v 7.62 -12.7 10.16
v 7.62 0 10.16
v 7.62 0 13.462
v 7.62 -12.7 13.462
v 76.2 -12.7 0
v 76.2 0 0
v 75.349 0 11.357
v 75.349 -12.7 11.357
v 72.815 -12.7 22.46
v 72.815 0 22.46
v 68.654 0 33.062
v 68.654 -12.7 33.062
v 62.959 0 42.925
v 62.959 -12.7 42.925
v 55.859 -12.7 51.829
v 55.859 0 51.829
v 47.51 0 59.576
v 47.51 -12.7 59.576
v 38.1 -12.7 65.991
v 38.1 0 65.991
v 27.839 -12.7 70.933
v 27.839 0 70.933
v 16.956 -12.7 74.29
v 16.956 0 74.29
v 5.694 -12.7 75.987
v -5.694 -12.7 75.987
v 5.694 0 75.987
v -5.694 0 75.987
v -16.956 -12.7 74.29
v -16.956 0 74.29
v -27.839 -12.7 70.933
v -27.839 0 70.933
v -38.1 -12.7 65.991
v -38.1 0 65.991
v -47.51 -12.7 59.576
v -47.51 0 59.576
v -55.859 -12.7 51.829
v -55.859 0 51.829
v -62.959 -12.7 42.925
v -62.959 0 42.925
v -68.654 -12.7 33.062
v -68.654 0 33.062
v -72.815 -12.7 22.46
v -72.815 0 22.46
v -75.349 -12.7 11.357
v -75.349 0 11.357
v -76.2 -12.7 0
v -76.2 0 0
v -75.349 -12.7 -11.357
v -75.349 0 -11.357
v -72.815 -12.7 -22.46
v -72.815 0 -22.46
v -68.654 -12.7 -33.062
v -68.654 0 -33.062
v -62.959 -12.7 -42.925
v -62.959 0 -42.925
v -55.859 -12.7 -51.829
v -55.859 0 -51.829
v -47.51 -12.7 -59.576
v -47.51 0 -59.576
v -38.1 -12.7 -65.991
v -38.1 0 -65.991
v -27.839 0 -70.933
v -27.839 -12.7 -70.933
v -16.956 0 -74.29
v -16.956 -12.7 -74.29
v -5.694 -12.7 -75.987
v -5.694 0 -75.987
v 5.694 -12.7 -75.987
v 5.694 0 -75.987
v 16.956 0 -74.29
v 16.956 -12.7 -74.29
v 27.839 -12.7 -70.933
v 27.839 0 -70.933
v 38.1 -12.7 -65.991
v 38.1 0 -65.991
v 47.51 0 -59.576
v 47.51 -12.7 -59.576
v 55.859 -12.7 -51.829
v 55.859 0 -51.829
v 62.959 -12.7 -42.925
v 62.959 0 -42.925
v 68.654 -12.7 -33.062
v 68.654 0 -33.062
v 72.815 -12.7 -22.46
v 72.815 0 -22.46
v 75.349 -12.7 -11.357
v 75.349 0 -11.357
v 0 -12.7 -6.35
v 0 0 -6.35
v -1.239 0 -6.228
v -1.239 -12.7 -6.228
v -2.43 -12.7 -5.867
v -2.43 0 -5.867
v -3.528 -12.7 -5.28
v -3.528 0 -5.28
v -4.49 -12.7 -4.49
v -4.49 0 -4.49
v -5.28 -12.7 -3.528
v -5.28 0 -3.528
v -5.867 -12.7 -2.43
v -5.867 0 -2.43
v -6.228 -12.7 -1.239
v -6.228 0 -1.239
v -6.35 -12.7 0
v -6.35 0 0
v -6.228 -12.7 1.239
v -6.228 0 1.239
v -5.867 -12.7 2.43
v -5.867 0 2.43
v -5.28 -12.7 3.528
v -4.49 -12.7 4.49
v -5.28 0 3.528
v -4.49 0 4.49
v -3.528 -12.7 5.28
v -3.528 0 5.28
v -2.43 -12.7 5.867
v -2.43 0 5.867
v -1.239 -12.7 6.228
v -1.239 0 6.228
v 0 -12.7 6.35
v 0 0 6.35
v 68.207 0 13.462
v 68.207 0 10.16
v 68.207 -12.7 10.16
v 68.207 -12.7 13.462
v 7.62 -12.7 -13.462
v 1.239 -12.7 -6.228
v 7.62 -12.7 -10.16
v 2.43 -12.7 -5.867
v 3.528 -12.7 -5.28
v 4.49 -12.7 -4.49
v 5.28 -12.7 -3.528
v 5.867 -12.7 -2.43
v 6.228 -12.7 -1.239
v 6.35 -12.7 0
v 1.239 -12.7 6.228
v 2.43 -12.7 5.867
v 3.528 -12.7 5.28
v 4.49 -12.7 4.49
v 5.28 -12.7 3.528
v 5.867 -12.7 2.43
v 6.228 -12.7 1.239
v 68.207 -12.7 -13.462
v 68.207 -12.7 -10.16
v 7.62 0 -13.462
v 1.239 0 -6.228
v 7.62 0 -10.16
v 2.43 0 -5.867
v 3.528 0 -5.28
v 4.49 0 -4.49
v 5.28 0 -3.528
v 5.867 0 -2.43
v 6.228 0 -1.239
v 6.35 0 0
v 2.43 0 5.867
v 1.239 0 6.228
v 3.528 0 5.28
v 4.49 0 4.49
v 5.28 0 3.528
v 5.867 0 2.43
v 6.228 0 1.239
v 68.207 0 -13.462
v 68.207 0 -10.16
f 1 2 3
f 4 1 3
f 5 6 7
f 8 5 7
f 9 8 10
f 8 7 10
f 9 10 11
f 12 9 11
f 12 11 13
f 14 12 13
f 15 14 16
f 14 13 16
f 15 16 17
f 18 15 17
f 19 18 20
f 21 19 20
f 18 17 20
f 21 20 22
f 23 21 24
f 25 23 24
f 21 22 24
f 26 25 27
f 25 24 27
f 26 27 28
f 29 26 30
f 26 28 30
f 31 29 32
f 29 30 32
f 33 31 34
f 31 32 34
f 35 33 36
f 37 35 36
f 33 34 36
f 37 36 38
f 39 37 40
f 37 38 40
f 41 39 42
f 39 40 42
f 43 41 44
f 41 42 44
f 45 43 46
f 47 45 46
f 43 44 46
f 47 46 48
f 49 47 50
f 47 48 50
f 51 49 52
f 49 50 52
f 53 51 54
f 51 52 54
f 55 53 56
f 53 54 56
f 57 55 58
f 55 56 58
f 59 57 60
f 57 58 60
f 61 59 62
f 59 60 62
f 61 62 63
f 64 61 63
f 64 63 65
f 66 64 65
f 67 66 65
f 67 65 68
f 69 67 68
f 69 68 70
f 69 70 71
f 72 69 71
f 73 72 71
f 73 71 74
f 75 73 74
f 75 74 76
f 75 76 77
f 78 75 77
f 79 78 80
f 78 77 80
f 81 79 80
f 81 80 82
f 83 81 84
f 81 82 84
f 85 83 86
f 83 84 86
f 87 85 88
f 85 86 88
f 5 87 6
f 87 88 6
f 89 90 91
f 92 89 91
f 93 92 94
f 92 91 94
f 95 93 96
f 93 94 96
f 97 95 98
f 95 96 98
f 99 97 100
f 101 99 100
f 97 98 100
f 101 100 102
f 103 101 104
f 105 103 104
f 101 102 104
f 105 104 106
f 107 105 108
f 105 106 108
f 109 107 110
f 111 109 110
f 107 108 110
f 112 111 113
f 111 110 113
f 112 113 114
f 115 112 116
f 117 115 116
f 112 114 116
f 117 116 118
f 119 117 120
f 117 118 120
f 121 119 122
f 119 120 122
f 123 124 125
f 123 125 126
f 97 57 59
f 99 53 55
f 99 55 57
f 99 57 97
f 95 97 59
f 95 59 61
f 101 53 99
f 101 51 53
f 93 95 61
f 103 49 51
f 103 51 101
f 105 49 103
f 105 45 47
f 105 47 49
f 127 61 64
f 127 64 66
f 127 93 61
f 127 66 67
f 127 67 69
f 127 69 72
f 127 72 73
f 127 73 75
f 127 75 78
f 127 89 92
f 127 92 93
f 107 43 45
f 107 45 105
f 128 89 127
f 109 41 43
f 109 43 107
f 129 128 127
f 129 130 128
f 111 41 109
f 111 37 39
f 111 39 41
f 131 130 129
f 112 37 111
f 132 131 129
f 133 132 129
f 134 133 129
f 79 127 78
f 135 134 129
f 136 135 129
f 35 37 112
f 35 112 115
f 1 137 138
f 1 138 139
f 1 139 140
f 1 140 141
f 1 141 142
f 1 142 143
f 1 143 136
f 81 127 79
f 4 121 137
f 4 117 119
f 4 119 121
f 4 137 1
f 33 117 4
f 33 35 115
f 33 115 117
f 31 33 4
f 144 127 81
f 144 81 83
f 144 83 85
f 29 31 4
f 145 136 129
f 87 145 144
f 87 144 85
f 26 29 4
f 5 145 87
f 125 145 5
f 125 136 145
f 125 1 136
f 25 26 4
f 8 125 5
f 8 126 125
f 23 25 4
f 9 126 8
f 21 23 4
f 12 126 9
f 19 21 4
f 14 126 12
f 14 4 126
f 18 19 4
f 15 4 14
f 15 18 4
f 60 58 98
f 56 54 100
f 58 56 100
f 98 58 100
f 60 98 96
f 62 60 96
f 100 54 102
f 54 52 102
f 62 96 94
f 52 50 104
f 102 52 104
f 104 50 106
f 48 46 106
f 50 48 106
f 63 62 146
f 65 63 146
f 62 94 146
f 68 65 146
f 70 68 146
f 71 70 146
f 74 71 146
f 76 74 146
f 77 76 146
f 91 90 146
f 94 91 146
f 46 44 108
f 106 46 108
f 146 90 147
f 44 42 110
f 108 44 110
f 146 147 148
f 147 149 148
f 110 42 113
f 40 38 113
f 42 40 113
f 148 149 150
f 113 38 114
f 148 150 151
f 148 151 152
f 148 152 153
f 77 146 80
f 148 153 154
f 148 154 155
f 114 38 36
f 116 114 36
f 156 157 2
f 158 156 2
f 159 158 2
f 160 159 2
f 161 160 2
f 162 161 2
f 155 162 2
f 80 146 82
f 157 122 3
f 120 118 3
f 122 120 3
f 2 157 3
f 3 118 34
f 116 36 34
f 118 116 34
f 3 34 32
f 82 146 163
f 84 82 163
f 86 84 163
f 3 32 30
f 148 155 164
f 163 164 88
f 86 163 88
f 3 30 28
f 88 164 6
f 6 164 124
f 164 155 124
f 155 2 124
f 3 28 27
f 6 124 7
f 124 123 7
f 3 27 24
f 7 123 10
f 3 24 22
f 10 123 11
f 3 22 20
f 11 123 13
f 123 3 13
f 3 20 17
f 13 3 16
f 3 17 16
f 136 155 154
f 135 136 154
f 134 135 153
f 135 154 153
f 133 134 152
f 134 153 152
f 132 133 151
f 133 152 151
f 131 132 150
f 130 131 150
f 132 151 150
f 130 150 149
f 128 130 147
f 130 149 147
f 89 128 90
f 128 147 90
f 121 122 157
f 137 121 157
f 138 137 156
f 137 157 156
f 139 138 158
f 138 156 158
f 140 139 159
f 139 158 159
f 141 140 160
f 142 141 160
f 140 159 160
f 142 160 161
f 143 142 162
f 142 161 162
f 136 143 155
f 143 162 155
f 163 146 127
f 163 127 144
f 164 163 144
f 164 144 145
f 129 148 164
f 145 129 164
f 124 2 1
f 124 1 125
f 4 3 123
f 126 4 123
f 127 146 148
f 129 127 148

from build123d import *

# Parameters (mm, degrees)
F0_R     = 76.2
F0_W     = 60.587234
F0_H     = 3.302
F1_DEPTH = 12.7


with BuildPart() as f1:
    # F0 (on Front) → F1 (new body)
    with BuildSketch(Plane.XZ):
        Circle(F0_R)
        with Locations((37.913617, -11.811)):
            Rectangle(F0_W, F0_H, mode=Mode.SUBTRACT)
        with BuildLine():
            ThreePointArc((0, -6.35), (-6.35, 0), (0, 6.35))
            Line((0, 6.35), (0, 10.16))
            Line((0, 10.16), (7.62, 10.16))
            Line((7.62, 10.16), (7.62, 1.651))
            Line((7.62, 1.651), (68.58, 1.651))
            Line((68.58, 1.651), (68.58, -1.651))
            Line((68.58, -1.651), (7.62, -1.651))
            Line((7.62, -1.651), (7.62, -10.16))
            Line((7.62, -10.16), (0, -10.16))
            Line((0, -10.16), (0, -6.35))
        make_face(mode=Mode.SUBTRACT)
        with Locations((37.913617, 11.811)):
            Rectangle(F0_W, F0_H, mode=Mode.SUBTRACT)
        with BuildLine():
            ThreePointArc((0, 6.35), (4.490128, 4.490128), (6.35, 0))
            Line((6.35, 0), (7.62, 0))
            Line((7.62, 0), (7.62, 1.651))
            Line((7.62, 1.651), (7.62, 10.16))
            Line((7.62, 10.16), (0, 10.16))
            Line((0, 10.16), (0, 6.35))
        make_face()
        with BuildLine():
            Line((7.62, 0), (6.35, 0))
            ThreePointArc((6.35, 0), (4.490128, -4.490128), (0, -6.35))
            Line((0, -6.35), (0, -10.16))
            Line((0, -10.16), (7.62, -10.16))
            Line((7.62, -10.16), (7.62, -1.651))
            Line((7.62, -1.651), (7.62, 0))
        make_face()
        Polygon((7.62, 1.651), (7.62, 0), (7.62, -1.651), (68.58, -1.651), (68.58, 1.651), align=None)
    extrude(amount=F1_DEPTH)


solid = f1.part
